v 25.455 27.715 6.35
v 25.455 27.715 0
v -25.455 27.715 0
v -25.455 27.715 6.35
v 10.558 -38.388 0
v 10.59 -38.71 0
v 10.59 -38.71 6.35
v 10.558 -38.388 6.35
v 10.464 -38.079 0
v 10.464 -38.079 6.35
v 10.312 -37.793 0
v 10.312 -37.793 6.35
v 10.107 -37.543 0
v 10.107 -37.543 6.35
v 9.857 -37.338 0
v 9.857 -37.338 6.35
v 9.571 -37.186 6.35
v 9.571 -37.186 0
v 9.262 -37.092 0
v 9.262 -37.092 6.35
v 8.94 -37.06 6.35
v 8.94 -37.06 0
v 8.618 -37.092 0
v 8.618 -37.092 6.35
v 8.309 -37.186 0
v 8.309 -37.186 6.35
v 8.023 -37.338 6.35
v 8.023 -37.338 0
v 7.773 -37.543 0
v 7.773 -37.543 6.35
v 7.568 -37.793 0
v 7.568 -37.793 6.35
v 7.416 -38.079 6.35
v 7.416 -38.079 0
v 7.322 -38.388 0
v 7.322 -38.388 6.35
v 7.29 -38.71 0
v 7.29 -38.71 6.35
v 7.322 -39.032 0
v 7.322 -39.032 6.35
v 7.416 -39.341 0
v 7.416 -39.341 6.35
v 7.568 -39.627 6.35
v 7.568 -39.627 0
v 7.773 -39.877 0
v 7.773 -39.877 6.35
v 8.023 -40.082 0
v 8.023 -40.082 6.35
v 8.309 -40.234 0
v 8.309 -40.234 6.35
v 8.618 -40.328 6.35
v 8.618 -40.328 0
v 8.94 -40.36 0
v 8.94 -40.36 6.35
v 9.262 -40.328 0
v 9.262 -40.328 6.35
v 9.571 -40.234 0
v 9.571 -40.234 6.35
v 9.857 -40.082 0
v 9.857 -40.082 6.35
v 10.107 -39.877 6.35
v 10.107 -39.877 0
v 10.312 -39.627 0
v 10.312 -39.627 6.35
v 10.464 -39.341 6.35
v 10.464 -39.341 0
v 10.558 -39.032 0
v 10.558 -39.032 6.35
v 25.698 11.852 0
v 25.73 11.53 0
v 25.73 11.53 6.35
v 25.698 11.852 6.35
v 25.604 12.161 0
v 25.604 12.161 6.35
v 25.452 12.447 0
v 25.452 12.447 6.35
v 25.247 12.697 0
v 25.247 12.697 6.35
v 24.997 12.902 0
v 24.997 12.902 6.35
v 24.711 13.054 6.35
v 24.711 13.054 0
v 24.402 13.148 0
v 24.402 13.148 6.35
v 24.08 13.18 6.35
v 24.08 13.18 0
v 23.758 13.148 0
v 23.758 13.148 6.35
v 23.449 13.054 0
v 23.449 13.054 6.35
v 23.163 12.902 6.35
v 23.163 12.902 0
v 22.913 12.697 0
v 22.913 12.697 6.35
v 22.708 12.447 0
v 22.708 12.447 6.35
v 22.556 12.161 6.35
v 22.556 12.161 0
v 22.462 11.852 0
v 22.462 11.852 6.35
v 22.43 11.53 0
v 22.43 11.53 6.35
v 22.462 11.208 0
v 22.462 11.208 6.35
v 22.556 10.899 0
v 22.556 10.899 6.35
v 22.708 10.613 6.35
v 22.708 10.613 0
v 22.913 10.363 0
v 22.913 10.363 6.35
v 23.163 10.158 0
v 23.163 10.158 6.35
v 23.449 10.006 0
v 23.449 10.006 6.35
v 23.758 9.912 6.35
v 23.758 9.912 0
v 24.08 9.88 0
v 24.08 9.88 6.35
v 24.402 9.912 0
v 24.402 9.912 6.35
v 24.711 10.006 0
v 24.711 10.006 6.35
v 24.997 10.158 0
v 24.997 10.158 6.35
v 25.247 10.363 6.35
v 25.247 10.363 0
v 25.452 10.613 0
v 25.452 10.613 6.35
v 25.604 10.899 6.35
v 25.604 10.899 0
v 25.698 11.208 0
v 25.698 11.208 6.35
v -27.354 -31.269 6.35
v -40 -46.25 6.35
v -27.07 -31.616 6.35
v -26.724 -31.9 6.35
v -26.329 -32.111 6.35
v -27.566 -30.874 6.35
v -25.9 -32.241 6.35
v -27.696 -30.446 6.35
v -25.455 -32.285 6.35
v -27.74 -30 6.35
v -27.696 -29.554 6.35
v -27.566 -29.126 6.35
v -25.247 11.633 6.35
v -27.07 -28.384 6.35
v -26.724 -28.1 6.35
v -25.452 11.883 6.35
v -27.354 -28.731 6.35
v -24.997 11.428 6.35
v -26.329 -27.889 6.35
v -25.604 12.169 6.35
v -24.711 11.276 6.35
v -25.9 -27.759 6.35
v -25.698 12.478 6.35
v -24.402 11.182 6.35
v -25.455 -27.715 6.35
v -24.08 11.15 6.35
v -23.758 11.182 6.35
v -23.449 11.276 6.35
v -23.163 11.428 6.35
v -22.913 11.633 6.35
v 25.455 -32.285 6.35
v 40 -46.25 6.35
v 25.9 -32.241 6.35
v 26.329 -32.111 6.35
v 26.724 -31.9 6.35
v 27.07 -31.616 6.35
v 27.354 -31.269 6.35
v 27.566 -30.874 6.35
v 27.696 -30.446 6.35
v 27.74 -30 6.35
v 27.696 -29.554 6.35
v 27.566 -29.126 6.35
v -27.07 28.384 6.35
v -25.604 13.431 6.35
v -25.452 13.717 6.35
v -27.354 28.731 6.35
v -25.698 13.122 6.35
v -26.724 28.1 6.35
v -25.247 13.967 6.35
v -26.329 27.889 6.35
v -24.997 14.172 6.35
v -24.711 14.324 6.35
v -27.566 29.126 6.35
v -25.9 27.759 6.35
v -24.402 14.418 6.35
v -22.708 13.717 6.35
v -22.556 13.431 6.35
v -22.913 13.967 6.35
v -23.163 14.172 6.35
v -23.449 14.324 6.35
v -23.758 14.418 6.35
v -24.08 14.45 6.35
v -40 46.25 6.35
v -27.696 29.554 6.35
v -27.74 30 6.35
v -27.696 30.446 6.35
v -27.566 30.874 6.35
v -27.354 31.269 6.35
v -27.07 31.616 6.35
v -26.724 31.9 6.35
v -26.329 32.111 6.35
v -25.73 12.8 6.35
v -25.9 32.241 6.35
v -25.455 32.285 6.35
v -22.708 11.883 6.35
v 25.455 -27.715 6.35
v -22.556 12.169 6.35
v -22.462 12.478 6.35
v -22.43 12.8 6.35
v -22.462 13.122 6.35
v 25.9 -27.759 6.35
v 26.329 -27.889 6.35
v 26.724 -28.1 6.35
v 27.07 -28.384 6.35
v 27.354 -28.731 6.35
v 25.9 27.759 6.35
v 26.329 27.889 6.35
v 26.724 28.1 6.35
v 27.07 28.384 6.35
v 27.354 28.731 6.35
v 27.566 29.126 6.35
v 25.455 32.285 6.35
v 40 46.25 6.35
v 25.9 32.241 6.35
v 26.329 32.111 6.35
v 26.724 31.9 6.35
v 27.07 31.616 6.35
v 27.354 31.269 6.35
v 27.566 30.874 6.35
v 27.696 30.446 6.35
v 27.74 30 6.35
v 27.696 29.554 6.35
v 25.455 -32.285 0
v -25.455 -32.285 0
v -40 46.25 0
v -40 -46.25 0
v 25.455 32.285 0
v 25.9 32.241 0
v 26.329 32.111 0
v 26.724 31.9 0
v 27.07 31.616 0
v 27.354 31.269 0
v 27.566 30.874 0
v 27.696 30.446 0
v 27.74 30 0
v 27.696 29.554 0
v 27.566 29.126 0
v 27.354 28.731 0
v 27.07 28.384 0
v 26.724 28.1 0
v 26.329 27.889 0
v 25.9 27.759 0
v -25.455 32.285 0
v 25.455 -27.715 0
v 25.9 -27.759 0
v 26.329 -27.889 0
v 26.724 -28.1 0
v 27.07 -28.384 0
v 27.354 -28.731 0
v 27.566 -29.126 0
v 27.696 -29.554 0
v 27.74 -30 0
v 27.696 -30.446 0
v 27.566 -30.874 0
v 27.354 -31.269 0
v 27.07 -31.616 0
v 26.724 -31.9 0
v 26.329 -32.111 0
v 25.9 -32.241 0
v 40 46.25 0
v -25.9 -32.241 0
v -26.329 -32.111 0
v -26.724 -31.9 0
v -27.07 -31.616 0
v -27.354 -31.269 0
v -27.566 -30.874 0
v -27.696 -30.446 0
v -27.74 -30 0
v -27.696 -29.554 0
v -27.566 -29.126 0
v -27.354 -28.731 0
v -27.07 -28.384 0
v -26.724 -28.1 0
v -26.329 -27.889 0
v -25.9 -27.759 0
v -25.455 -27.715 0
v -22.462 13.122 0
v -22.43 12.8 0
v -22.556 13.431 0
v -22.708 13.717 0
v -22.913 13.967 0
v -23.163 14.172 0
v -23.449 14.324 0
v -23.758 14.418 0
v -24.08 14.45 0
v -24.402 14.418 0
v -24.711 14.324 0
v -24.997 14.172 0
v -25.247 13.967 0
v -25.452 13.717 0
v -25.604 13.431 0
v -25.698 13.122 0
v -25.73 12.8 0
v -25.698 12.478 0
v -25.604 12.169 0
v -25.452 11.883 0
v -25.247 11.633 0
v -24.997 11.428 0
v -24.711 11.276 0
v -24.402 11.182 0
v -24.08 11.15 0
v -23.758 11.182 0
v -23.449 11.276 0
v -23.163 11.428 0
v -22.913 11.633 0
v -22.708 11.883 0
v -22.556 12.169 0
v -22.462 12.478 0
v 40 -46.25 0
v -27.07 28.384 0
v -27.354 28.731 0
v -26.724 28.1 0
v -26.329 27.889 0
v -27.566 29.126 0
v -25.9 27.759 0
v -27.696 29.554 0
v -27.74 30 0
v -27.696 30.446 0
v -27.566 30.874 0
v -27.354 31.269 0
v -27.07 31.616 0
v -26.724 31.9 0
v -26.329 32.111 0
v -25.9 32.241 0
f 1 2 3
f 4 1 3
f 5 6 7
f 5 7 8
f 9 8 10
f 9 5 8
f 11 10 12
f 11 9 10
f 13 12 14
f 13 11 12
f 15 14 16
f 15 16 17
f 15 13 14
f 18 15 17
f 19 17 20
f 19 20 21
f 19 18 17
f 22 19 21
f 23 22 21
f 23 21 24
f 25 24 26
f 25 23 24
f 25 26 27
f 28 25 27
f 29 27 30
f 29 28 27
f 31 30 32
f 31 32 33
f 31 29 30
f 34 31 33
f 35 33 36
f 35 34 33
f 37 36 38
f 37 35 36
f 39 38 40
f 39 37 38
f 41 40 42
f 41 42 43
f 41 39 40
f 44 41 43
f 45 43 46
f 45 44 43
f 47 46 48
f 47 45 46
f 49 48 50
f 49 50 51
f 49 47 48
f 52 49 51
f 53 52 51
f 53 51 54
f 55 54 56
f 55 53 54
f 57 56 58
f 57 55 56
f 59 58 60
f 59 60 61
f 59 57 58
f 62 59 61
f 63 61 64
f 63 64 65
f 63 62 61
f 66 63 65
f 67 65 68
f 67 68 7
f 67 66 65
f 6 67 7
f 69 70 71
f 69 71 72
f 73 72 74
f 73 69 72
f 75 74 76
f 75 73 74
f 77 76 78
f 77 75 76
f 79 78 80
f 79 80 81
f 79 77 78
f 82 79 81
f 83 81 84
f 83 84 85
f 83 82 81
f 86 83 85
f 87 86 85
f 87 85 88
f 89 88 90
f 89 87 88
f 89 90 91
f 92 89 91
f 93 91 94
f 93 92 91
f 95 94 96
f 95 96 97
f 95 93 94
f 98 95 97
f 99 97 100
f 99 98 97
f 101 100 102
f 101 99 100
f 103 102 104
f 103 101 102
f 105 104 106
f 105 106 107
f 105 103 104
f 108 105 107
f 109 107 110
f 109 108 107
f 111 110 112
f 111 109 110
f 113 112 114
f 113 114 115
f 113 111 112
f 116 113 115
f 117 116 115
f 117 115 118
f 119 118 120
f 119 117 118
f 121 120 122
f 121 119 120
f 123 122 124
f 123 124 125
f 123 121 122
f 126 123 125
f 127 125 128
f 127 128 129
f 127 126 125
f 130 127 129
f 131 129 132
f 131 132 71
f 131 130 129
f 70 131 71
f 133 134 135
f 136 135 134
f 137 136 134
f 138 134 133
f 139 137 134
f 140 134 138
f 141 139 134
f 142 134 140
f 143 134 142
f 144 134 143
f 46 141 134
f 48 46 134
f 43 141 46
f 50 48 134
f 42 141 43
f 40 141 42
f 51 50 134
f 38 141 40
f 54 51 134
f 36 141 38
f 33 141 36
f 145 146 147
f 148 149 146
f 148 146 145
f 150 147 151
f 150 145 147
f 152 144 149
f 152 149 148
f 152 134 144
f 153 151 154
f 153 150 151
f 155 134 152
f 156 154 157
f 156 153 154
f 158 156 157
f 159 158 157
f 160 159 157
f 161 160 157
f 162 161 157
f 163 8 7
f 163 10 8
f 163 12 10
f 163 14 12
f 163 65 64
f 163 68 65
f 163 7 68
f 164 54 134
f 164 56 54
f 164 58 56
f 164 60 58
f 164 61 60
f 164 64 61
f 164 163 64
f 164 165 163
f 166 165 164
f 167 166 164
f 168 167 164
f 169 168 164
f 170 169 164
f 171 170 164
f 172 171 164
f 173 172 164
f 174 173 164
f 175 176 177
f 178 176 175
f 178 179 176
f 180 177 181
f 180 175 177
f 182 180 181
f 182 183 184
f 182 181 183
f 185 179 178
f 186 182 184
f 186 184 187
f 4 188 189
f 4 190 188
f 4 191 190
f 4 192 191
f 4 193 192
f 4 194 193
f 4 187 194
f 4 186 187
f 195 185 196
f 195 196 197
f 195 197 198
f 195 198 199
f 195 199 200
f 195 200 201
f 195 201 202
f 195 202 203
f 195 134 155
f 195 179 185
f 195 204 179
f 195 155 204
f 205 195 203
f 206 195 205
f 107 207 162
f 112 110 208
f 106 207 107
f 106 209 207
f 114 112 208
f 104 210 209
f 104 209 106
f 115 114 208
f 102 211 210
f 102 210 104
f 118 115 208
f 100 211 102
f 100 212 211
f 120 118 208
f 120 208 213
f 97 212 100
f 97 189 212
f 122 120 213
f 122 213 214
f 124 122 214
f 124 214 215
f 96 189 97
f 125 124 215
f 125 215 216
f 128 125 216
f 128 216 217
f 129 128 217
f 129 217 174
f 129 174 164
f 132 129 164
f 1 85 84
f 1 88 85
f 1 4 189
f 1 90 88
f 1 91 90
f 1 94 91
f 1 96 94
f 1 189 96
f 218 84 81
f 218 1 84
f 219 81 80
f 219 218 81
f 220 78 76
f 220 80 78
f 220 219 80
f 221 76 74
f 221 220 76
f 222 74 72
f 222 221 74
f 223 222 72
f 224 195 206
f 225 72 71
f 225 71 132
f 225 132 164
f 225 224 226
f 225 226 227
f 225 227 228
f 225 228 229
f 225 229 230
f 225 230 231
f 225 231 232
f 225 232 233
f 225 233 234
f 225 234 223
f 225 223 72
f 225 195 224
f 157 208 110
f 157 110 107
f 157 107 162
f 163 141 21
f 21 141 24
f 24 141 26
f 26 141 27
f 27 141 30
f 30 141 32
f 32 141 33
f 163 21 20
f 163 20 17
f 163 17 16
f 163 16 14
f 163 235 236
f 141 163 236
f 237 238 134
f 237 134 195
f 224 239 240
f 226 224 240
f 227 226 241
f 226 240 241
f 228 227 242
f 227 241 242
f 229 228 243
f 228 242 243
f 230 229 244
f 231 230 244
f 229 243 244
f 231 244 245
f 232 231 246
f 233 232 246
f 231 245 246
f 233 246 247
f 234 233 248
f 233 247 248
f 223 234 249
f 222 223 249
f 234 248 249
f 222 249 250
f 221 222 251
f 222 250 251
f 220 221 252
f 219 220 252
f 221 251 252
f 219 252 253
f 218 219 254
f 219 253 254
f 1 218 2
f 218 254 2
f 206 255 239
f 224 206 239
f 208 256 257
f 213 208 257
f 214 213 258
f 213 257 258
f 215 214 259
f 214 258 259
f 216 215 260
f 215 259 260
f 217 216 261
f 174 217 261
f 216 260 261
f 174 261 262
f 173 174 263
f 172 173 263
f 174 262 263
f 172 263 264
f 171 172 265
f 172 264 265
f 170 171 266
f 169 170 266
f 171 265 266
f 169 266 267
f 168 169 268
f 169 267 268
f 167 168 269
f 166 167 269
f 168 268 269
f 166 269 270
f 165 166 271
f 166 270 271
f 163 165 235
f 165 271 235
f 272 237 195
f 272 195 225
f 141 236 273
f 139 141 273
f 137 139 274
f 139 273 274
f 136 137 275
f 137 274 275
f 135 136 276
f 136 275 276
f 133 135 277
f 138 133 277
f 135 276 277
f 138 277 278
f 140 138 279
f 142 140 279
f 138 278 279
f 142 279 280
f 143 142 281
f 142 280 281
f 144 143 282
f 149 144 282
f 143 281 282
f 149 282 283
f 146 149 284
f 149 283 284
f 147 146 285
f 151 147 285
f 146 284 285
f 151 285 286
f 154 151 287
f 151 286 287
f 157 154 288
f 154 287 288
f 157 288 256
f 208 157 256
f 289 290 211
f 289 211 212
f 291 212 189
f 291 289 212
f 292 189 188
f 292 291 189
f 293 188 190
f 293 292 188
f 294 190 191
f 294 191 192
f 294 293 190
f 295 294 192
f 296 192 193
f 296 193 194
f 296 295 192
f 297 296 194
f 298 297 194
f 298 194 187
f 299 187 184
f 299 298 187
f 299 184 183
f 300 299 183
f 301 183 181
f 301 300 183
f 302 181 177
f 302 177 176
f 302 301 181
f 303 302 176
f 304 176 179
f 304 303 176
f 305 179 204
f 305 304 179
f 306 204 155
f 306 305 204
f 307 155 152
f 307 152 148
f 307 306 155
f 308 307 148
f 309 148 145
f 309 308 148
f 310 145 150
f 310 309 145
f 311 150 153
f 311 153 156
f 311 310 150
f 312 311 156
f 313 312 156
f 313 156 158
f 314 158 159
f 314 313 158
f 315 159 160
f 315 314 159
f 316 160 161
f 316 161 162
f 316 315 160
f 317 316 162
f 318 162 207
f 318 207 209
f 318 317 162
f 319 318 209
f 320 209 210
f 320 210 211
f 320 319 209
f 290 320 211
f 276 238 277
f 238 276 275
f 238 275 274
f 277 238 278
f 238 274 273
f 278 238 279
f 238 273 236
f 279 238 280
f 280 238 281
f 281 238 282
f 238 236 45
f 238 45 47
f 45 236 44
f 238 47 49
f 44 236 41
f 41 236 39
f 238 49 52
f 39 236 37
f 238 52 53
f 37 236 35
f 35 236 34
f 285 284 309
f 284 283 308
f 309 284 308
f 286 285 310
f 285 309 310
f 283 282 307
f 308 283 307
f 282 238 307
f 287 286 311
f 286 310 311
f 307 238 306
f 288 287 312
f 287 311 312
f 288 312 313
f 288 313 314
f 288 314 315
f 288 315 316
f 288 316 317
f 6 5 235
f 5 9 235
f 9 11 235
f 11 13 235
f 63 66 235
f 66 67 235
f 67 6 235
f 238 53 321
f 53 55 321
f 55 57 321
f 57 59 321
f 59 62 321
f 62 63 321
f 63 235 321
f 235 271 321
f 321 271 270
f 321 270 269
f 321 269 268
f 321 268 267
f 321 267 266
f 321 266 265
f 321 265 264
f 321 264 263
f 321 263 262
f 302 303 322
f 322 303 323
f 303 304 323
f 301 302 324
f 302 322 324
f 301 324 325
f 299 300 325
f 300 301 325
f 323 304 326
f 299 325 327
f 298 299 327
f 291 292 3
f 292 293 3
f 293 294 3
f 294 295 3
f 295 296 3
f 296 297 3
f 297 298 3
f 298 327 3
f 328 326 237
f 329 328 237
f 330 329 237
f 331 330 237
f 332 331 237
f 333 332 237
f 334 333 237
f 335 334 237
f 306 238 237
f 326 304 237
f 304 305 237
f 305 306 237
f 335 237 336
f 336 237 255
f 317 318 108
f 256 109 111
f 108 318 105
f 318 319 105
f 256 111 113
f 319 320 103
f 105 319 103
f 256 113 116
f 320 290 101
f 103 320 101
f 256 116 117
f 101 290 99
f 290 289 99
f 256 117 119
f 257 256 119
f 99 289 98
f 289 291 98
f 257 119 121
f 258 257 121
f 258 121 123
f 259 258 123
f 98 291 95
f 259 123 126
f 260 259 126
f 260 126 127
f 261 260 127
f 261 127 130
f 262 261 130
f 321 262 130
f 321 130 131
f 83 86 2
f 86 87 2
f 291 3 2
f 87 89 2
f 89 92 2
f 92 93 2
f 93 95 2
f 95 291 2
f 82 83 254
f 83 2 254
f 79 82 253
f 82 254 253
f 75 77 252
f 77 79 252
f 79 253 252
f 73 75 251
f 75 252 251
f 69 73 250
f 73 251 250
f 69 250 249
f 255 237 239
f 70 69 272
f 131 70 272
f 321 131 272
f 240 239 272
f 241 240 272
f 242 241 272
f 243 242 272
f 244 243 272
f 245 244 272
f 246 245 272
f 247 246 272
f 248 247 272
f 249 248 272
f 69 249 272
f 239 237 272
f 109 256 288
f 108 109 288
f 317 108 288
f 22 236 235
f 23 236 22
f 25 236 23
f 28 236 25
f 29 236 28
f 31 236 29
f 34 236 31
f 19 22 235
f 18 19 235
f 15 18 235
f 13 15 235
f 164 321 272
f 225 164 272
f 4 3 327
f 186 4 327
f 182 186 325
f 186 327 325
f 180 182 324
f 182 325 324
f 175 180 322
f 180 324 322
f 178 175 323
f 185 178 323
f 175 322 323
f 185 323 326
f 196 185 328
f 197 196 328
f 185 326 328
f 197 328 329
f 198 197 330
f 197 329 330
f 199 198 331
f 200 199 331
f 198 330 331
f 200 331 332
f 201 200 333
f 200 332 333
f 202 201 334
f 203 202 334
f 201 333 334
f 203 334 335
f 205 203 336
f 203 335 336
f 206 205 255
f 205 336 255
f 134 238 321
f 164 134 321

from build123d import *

# Parameters (mm, degrees)
SKETCH1_W           = 80
SKETCH1_H           = 92.5
SKETCH1_R           = 1.65
BOSS_EXTRUDE2_DEPTH = 6.35


with BuildPart() as part:
    # Sketch1 → Boss-Extrude2 (new body)
    with BuildSketch(Plane.XY):
        Rectangle(SKETCH1_W, SKETCH1_H)
        with Locations((-24.08, 12.8)):
            Circle(SKETCH1_R, mode=Mode.SUBTRACT)
        with Locations((24.08, 11.53)):
            Circle(SKETCH1_R, mode=Mode.SUBTRACT)
        with Locations((8.94, -38.71)):
            Circle(SKETCH1_R, mode=Mode.SUBTRACT)
        with BuildLine():
            Line((-25.454545455, 32.285), (25.454545455, 32.285))
            ThreePointArc((25.454545455, 32.285), (27.739545455, 30), (25.454545455, 27.715))
            Line((25.454545455, 27.715), (-25.454545455, 27.715))
            ThreePointArc((-25.454545455, 27.715), (-27.739545455, 30), (-25.454545455, 32.285))
        make_face(mode=Mode.SUBTRACT)
        with BuildLine():
            Line((-25.454545455, -27.715), (25.454545455, -27.715))
            ThreePointArc((25.454545455, -27.715), (27.739545455, -30), (25.454545455, -32.285))
            Line((25.454545455, -32.285), (-25.454545455, -32.285))
            ThreePointArc((-25.454545455, -32.285), (-27.739545455, -30), (-25.454545455, -27.715))
        make_face(mode=Mode.SUBTRACT)
    extrude(amount=BOSS_EXTRUDE2_DEPTH)


solid = part.part
